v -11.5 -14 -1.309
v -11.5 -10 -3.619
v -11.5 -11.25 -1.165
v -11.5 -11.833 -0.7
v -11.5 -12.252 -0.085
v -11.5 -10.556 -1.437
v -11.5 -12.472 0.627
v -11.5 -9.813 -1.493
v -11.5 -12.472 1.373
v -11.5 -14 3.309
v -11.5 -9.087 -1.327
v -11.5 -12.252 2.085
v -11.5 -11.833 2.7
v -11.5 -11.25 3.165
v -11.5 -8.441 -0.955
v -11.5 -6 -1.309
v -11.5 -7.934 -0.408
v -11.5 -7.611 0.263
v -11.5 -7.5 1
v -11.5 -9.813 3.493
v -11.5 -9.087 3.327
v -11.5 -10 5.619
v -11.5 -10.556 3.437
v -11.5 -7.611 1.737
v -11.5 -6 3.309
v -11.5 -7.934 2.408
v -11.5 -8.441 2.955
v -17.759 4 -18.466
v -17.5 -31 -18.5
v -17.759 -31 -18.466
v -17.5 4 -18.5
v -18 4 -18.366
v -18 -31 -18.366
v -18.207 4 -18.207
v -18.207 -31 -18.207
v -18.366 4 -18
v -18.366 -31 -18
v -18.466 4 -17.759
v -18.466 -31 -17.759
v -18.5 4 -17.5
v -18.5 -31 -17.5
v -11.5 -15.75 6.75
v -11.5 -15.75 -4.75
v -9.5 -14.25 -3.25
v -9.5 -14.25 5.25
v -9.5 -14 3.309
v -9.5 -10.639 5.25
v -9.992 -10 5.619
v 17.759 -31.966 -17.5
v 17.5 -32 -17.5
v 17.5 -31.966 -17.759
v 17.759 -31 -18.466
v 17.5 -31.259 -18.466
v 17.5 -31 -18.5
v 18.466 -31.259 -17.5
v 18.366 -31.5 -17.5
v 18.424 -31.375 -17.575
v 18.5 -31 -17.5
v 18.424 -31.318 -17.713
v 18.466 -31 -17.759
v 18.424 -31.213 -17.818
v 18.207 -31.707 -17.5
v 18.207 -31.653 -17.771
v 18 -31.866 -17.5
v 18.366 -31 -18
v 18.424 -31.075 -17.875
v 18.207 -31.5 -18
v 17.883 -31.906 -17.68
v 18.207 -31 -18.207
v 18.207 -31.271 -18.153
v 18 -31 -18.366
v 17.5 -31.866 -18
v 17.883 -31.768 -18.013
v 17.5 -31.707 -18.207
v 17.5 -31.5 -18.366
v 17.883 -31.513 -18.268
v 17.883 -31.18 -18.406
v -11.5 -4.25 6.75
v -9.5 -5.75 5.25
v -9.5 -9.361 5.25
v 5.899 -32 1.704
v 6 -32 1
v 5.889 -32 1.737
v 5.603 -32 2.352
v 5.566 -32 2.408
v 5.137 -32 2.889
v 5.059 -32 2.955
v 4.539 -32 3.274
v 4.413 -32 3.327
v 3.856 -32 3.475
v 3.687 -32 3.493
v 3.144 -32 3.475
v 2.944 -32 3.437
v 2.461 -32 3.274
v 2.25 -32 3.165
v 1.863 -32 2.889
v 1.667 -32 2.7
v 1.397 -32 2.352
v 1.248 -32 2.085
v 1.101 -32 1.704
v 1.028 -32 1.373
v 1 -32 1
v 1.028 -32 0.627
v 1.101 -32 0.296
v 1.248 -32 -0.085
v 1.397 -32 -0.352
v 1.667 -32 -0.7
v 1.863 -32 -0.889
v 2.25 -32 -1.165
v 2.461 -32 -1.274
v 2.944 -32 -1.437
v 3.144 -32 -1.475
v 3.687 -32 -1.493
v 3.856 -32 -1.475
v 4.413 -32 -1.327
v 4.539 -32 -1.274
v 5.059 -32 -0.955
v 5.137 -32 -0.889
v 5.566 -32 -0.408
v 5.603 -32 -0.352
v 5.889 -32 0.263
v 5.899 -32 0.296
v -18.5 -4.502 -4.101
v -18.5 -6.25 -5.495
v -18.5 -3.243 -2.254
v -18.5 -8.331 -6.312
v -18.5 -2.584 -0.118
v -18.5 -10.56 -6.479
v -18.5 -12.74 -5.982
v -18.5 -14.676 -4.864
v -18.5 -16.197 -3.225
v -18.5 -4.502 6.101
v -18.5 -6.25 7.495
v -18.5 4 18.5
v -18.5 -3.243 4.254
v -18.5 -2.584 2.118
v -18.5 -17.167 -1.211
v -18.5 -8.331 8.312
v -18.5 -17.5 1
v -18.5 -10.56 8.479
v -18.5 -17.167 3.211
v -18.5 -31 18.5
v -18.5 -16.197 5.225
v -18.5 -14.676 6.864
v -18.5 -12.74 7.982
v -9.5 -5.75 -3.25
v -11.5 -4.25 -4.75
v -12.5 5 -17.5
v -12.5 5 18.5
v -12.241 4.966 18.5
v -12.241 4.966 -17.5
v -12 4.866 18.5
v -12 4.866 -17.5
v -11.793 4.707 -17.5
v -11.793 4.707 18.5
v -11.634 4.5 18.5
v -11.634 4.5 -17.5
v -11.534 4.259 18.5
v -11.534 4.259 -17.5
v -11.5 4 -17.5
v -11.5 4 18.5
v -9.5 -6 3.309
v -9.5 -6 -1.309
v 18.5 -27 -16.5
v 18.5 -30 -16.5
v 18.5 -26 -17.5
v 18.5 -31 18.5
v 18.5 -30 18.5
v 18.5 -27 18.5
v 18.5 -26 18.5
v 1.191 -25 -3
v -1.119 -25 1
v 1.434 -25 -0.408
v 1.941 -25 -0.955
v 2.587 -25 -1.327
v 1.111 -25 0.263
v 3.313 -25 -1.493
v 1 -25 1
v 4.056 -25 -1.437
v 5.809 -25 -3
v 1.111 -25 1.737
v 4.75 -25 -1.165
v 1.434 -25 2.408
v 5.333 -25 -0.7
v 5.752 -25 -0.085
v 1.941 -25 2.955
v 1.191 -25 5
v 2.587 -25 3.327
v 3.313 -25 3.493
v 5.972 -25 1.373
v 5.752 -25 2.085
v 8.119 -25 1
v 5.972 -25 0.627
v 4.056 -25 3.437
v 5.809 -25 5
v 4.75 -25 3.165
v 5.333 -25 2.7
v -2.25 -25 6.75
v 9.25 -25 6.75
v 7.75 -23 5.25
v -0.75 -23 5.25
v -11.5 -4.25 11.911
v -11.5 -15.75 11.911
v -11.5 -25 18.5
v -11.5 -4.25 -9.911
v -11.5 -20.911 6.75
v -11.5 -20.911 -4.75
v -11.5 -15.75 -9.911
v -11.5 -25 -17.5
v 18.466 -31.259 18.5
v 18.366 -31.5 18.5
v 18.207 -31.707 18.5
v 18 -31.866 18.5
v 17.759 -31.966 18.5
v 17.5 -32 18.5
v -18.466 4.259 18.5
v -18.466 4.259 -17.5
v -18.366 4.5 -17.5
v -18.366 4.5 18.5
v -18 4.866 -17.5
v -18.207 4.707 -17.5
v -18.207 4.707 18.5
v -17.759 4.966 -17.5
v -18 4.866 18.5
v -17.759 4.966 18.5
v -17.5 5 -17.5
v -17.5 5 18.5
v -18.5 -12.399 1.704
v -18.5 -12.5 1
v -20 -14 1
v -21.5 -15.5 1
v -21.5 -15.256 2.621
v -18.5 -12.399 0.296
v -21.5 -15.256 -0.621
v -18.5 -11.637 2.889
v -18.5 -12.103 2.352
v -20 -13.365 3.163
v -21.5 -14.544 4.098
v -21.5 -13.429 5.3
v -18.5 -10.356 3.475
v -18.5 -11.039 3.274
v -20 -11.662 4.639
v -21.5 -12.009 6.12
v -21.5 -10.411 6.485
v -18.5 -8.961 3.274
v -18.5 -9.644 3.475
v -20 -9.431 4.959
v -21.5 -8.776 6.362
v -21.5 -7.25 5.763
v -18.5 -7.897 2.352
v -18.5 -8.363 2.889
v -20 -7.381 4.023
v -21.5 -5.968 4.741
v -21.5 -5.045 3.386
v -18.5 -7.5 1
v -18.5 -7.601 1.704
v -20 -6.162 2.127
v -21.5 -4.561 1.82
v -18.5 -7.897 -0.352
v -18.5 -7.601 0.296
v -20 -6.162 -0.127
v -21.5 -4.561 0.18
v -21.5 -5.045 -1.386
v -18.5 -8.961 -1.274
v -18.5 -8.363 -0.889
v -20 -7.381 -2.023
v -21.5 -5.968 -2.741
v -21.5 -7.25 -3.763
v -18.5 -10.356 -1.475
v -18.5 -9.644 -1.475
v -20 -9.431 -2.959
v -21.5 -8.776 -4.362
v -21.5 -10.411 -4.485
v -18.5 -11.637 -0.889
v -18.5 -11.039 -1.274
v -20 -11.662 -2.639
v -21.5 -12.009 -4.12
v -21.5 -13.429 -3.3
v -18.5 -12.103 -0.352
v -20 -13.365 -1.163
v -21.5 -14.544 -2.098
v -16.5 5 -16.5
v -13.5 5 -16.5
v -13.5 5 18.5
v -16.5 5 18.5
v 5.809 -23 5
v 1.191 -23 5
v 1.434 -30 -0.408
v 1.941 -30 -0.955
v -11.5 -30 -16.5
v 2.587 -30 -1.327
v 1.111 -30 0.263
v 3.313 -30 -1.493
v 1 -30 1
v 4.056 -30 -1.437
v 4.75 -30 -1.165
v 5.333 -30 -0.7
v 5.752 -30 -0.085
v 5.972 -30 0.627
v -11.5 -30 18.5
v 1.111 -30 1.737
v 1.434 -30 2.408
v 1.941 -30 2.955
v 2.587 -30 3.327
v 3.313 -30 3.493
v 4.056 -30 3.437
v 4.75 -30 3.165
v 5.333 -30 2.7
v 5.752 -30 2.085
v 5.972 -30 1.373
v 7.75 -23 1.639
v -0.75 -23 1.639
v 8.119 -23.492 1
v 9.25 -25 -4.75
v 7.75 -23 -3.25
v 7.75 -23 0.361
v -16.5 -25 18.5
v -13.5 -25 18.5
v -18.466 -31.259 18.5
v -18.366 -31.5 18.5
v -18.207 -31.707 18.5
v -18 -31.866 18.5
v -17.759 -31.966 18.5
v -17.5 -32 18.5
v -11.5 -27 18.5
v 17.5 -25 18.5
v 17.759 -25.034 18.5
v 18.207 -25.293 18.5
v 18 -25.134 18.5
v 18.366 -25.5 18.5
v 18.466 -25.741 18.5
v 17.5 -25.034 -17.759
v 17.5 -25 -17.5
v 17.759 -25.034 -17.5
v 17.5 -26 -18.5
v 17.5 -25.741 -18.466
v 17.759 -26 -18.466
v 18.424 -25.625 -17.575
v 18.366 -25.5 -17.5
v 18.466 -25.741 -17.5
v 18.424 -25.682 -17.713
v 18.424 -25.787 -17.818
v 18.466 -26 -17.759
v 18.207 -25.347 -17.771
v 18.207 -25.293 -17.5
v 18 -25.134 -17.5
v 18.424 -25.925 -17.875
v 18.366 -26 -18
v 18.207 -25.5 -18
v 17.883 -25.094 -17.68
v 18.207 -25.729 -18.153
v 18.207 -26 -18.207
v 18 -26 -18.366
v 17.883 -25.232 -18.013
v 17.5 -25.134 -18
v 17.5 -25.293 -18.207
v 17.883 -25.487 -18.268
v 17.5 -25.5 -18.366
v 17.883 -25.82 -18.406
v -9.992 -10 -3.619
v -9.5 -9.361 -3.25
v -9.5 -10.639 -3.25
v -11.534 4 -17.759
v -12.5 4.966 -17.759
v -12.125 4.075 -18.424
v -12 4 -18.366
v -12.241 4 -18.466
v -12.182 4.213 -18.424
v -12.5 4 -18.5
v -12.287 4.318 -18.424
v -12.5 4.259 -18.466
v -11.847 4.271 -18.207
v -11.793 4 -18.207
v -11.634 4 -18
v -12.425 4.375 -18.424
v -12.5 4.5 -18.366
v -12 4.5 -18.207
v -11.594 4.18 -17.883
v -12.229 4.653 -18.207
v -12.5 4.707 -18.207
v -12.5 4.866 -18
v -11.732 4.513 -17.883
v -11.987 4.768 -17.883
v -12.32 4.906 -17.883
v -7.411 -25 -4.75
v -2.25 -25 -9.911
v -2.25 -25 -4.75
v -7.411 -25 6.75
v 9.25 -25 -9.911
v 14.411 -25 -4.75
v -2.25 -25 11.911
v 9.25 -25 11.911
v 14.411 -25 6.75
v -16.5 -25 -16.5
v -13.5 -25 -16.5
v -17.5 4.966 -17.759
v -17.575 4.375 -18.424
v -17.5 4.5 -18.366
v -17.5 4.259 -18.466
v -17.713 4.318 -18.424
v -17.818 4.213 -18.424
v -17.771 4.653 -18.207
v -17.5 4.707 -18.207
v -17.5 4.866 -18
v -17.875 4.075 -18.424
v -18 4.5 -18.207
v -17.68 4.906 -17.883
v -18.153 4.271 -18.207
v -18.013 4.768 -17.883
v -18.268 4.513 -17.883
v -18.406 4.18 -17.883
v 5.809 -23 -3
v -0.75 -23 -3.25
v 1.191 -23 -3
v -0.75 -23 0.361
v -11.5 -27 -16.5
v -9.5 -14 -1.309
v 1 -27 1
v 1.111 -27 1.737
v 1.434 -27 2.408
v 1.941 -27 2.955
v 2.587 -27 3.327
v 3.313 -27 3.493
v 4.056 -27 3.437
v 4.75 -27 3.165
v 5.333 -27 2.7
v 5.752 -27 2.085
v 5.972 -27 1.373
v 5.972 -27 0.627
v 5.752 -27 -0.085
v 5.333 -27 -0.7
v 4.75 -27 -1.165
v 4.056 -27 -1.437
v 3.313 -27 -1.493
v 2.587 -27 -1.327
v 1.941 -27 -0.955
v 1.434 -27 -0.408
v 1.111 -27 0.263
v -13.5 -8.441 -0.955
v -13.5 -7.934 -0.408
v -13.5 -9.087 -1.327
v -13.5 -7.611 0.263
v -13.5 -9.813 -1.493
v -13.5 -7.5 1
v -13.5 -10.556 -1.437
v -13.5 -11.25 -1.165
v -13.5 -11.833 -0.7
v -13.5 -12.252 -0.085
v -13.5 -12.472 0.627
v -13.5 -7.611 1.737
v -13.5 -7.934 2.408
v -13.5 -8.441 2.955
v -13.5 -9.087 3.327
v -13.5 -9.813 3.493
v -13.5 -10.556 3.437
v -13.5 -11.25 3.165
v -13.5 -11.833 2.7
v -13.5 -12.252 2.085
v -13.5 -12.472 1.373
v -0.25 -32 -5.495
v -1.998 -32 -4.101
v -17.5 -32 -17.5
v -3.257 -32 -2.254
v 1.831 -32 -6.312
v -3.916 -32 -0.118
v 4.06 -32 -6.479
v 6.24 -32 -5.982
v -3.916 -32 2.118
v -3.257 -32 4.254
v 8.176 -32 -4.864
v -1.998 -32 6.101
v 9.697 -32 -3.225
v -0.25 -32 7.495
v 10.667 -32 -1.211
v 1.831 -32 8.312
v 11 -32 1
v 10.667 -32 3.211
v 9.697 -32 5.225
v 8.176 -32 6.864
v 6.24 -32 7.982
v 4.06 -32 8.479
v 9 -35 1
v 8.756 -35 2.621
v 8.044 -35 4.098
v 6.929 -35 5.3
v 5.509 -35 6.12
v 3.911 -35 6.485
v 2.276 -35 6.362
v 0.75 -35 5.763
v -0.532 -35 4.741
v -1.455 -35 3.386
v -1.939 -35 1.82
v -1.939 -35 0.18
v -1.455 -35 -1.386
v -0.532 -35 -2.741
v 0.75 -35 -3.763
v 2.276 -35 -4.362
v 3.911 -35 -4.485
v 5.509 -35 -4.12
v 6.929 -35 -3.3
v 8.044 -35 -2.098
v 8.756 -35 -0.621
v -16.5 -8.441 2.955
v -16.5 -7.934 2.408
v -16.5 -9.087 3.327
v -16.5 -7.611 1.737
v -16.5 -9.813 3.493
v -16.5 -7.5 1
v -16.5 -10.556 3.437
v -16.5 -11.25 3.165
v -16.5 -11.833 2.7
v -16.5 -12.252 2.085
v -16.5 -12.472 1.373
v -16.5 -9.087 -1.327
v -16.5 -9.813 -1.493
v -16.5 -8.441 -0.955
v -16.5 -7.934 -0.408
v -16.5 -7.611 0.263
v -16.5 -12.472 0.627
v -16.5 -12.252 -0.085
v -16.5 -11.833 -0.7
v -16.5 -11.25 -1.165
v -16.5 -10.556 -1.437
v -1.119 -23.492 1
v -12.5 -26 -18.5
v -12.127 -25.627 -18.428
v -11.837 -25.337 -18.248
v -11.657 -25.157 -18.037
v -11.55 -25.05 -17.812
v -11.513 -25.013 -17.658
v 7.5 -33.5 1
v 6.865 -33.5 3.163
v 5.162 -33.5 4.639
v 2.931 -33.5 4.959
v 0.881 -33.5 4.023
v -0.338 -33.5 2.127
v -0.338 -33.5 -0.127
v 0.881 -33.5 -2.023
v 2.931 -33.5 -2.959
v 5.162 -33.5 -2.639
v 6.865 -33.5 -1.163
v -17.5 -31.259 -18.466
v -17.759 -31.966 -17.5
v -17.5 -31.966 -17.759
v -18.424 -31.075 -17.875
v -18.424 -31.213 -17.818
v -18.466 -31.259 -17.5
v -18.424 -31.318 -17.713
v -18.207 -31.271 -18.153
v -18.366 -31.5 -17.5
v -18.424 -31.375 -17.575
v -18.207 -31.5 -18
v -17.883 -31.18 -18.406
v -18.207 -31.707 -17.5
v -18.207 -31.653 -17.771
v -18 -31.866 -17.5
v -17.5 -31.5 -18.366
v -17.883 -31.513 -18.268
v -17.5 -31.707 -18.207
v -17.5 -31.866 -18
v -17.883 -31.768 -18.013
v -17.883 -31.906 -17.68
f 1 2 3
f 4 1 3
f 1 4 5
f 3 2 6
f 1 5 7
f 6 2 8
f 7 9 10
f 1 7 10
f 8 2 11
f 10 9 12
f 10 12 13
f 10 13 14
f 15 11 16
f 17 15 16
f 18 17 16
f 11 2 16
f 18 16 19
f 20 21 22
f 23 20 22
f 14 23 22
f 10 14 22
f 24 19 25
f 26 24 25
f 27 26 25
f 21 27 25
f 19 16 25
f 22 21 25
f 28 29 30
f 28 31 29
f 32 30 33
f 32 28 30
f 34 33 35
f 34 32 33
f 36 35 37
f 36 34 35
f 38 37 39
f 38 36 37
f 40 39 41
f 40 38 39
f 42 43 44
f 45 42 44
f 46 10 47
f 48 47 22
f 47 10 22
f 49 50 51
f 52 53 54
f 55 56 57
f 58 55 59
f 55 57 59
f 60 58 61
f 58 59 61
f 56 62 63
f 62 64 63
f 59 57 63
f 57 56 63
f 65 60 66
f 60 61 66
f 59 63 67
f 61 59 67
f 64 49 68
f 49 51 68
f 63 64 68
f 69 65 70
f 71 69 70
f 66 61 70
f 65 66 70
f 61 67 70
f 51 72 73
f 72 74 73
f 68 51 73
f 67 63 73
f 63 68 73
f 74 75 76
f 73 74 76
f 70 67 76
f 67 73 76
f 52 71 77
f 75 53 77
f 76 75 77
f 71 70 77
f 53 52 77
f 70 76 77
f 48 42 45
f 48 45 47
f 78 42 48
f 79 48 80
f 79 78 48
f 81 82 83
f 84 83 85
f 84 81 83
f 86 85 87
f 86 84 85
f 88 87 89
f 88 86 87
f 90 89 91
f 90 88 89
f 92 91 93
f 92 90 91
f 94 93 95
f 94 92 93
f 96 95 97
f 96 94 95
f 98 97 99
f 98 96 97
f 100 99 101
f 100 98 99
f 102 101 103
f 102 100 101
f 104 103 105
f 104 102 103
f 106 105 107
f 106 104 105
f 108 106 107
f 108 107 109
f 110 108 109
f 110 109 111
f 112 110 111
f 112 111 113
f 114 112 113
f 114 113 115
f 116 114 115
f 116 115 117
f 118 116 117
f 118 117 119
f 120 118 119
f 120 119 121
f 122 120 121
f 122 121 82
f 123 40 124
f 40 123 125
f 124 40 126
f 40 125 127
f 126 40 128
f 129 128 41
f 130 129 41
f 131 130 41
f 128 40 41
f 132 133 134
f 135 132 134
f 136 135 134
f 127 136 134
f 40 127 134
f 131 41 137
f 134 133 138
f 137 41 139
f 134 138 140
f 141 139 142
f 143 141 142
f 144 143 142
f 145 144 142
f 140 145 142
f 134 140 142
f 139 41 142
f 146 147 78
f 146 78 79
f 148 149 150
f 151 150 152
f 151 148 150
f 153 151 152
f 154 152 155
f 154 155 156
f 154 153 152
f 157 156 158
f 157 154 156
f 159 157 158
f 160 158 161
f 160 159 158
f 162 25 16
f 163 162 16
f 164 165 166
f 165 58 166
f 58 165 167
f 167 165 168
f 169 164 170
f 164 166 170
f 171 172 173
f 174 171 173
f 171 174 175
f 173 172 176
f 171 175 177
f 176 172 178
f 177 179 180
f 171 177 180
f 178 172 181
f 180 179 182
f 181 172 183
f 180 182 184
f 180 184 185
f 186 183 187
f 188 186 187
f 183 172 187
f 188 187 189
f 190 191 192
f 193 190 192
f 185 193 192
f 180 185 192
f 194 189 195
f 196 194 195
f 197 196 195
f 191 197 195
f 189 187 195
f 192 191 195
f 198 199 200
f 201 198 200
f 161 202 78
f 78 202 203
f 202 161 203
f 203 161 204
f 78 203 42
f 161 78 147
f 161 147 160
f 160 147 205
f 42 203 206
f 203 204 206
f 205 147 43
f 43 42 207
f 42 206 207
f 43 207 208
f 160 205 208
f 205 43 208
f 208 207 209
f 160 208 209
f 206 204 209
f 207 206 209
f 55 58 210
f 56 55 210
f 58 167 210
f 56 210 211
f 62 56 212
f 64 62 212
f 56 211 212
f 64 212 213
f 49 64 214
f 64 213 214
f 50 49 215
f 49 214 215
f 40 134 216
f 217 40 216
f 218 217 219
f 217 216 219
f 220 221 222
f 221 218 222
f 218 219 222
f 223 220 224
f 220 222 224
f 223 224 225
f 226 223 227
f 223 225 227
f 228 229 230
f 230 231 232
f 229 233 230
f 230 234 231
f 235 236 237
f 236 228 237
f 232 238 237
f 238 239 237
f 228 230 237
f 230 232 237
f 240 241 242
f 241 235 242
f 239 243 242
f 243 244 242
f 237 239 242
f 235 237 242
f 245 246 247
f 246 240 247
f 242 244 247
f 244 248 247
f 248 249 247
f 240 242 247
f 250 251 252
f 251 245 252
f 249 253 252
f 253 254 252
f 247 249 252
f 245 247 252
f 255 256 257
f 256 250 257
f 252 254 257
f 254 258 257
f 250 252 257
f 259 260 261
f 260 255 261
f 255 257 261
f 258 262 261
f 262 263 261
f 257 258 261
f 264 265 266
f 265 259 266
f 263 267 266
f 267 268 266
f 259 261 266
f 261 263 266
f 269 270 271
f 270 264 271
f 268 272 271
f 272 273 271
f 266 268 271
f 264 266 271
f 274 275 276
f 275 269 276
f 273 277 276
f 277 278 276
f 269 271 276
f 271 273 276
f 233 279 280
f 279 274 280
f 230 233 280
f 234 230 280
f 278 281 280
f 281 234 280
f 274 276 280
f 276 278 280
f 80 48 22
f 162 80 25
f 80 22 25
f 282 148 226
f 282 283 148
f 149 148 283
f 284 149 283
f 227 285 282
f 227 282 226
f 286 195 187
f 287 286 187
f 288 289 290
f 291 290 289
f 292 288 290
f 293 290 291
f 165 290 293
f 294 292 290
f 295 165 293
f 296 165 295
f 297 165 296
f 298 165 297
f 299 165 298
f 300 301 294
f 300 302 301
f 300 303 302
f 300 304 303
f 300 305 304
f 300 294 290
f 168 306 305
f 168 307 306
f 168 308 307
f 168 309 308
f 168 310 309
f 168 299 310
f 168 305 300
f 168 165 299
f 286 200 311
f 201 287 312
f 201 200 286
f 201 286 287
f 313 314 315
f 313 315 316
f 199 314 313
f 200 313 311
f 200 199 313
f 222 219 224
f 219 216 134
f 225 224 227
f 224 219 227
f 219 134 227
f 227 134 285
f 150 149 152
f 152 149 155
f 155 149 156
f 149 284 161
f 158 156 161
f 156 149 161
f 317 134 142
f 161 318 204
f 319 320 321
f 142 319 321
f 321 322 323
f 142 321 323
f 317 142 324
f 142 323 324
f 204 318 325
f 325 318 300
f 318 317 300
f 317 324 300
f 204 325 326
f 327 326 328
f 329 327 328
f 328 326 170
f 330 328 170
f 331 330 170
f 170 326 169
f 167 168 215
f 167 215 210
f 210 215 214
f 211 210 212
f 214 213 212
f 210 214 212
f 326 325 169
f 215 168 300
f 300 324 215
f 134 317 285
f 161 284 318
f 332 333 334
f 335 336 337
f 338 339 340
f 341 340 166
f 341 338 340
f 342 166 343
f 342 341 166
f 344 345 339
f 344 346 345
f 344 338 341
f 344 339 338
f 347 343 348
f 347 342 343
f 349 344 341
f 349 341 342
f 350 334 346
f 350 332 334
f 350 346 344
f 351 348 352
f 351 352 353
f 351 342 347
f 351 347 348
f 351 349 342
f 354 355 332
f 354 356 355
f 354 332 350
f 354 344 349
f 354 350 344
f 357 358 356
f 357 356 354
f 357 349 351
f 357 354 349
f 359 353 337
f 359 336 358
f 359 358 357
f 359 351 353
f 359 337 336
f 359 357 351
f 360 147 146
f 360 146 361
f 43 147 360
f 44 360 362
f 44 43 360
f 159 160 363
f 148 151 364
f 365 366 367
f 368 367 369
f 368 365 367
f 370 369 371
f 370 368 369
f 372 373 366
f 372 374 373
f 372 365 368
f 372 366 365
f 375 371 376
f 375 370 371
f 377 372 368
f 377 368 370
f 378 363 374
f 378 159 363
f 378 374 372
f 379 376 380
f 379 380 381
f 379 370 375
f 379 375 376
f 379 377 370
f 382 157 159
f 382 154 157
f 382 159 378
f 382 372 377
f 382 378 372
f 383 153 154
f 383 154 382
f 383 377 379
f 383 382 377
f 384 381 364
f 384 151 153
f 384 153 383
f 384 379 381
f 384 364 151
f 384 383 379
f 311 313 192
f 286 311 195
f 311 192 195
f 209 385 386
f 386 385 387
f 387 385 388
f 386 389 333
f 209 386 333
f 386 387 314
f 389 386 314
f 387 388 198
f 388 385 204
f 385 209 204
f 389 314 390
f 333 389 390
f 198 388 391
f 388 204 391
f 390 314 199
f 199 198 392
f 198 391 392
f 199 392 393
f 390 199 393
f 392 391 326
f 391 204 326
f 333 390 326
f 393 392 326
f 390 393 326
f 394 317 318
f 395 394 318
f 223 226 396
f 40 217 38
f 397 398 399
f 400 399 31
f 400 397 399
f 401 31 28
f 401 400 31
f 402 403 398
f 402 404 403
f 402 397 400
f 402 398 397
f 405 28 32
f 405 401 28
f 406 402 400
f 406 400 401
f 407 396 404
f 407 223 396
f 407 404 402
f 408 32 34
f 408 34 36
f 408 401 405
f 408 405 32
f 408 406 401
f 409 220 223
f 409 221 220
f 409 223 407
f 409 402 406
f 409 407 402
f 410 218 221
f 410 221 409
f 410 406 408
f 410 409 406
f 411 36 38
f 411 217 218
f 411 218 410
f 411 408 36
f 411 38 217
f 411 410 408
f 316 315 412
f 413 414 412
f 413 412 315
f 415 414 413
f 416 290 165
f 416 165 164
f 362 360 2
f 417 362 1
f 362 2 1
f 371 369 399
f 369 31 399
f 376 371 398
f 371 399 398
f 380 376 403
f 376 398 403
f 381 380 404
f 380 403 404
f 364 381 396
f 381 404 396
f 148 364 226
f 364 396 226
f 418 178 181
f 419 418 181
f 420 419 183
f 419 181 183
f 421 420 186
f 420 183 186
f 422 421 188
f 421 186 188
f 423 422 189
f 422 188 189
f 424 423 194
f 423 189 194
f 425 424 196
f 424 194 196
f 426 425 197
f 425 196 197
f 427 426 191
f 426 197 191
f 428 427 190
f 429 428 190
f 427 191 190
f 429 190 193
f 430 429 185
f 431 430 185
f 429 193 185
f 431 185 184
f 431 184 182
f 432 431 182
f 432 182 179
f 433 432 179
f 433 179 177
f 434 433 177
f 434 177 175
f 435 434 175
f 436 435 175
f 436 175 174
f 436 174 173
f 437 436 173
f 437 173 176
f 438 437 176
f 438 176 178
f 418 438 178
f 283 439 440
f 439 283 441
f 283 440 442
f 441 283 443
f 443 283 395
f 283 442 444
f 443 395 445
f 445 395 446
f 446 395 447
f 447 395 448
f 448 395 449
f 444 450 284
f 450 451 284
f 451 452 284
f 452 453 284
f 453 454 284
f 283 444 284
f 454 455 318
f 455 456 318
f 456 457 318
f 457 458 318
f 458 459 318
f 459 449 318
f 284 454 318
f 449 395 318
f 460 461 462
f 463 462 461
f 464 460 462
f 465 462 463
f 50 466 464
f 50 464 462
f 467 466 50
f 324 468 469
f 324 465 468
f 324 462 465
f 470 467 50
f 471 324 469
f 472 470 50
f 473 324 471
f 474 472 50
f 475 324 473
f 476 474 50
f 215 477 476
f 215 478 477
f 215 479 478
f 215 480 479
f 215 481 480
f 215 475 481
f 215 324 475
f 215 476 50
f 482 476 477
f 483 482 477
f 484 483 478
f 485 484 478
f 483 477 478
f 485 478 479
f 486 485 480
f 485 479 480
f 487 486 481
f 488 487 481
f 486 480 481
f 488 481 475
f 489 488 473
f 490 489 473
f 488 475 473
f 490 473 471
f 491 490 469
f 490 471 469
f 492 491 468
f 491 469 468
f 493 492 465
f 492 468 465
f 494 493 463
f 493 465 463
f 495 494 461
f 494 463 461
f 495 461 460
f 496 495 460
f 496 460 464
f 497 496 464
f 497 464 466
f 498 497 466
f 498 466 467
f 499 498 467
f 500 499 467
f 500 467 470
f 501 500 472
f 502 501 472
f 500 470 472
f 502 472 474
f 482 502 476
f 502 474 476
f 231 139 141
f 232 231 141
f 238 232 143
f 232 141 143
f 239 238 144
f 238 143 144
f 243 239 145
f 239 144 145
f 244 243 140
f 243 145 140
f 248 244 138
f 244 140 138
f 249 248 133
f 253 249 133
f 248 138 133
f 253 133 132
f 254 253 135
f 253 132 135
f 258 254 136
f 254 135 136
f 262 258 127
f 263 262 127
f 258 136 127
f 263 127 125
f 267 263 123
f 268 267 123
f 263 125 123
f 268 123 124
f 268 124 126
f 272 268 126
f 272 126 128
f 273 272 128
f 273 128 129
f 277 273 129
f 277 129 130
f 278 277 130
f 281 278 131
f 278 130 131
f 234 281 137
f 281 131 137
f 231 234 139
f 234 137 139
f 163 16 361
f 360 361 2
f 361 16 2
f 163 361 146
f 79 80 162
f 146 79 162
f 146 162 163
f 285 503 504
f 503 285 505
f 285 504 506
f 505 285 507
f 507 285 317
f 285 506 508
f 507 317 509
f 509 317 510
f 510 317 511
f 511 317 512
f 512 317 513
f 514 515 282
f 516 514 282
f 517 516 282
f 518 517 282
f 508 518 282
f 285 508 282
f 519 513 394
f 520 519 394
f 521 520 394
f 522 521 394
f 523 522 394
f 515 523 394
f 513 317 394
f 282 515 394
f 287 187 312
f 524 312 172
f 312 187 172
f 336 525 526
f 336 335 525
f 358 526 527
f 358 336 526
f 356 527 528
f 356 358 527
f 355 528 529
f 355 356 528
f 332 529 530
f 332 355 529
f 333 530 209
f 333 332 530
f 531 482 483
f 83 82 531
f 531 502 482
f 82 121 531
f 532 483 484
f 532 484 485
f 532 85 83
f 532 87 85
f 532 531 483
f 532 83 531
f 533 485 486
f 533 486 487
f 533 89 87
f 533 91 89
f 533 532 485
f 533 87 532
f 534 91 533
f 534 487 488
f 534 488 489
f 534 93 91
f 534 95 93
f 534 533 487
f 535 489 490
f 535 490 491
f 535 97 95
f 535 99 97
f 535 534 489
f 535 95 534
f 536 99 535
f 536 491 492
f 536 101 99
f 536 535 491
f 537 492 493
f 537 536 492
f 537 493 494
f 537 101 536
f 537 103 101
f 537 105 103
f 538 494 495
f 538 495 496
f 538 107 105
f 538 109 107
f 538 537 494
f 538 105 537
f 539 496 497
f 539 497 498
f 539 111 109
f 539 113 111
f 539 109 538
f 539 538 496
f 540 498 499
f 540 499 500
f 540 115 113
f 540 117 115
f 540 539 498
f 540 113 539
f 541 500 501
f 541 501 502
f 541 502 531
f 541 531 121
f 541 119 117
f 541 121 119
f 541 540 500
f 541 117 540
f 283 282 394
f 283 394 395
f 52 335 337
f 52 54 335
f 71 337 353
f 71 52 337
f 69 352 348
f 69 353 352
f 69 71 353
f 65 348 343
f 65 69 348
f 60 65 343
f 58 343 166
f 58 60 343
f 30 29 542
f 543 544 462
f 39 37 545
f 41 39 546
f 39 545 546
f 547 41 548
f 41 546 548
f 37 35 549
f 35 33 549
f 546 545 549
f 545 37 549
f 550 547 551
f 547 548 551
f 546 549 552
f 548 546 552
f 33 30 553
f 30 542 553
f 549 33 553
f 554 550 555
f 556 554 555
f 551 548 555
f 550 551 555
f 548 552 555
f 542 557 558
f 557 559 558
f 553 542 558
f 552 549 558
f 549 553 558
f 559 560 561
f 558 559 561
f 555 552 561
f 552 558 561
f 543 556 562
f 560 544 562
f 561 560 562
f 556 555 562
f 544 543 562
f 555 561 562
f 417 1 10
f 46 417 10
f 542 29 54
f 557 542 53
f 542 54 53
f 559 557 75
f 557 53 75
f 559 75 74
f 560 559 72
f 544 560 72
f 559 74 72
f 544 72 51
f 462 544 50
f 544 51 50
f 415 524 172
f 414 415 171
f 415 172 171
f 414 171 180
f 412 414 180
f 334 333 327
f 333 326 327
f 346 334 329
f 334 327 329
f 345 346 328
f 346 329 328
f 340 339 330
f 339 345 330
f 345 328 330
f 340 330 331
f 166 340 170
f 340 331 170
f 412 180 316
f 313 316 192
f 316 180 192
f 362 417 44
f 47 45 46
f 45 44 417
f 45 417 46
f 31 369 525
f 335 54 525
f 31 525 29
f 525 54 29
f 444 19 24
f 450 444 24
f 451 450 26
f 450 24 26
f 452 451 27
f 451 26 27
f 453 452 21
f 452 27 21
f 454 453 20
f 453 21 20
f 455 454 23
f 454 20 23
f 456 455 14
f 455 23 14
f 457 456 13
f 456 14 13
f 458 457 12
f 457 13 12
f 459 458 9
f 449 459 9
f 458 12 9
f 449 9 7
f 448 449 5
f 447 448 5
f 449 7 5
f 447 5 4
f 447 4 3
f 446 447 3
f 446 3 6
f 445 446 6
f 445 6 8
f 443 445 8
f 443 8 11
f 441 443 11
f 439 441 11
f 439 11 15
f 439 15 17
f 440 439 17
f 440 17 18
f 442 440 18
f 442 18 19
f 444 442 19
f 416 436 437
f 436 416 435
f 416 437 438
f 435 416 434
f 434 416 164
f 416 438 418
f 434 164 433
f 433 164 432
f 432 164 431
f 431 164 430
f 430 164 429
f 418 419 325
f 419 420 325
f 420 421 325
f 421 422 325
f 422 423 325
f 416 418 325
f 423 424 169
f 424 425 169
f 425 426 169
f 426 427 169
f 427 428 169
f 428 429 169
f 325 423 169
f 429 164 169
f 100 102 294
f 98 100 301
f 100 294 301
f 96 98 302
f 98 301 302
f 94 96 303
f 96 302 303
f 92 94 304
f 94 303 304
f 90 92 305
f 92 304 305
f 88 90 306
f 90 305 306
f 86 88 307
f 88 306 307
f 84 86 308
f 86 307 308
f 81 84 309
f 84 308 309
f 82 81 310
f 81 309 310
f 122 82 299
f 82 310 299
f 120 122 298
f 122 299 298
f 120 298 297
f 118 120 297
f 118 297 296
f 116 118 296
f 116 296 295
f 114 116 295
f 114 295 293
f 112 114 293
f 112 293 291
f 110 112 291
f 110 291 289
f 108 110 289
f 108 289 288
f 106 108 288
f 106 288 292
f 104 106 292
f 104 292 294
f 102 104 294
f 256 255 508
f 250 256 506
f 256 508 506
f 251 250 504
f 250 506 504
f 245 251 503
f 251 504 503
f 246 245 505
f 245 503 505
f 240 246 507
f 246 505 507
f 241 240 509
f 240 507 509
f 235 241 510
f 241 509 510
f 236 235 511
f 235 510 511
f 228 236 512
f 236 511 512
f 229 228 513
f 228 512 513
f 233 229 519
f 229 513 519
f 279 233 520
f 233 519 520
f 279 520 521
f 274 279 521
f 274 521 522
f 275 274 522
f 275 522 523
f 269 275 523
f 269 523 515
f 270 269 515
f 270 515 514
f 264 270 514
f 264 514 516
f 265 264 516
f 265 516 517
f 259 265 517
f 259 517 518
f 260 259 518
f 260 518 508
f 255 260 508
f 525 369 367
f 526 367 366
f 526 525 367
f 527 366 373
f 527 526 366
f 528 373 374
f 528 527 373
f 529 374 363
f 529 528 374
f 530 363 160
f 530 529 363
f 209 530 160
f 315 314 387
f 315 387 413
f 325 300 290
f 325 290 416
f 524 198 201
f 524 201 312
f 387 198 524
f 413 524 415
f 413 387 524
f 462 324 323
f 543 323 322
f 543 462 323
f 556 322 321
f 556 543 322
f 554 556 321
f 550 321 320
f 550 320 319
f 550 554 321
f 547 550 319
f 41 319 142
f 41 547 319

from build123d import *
from build123d import SkipClean  # not in build123d's __all__

# Parameters (mm, degrees)
F0_W          = 30
F0_H          = 37
F0_W_2        = 3
F0_H_2        = 35
F1_DEPTH      = 32
F2_DEPTH      = 25
F3_W          = 3
F3_H          = 35
F4_DEPTH      = 30
F5_W          = 11.5
F5_H          = 11.5
F6_DEPTH      = 2
F5_R          = 2.5
F7_DEPTH      = 25
F8_T4_DEPTH   = 21.8227903205
F8_T9_DEPTH   = 21.8227903205
F8_T14_DEPTH  = 21.8227903205
F8_T19_DEPTH  = 21.8227903205
F9_R          = 7.5
F9_R_2        = 2.5
F10_DEPTH     = 3
F11_SIZE      = 2.99999
F12_W         = 11.5
F12_H         = 11.5
F13_DEPTH     = 2
F14_T4_DEPTH  = 21.8227903205
F14_T9_DEPTH  = 21.8227903205
F14_T14_DEPTH = 21.8227903205
F14_T19_DEPTH = 21.8227903205
F12_R         = 2.5
F15_DEPTH     = 25
F16_R         = 7.5
F16_R_2       = 2.5
F17_DEPTH     = 3
F19_SIZE2     = 2.99999
F19_SIZE      = 1.99999
F19_2_SIZE2   = 2.99999
F19_2_SIZE    = 1.99999
F21_DEPTH     = 5
F22_R         = 1


# Not quite as in the source:
# - a fillet or chamfer that OpenCascade refuses, or shapes differently, is made with other operations: its cross-section is extruded or revolved along the edge and cut away or added
# - a fillet or chamfer is up to 0.001 mm smaller than in the source, because OpenCascade refuses the exact size
# - after a boolean that leaves OpenCascade's solid faulty, fix() repairs it


with BuildPart() as f1:
    # F0 (on Front) → F1 (new body)
    with BuildSketch(Plane.XZ):
        with Locations((3.5, 0)):
            Rectangle(F0_W, F0_H)
        Polygon((-18.5, -18.5), (-11.5, -18.5), (-11.5, 18.5), (-13.5, 18.5), (-13.5, -16.5), (-16.5, -16.5), (-16.5, 18.5), (-18.5, 18.5), align=None)
        with Locations((-15, 1)):
            Rectangle(F0_W_2, F0_H_2)
    extrude(amount=F1_DEPTH)

    # F0 (on Front) → F2 (cut)
    with BuildSketch(Plane.XZ):
        with Locations((3.5, 0)):
            Rectangle(F0_W, F0_H)
        with Locations((-15, 1)):
            Rectangle(F0_W_2, F0_H_2)
    extrude(amount=F2_DEPTH, mode=Mode.SUBTRACT)

    # F3 (on face) → F4 (cut)
    with BuildSketch(Plane.YZ.offset(18.5)):
        with Locations((-28.5, 1)):
            Rectangle(F3_W, F3_H)
    extrude(amount=-F4_DEPTH, mode=Mode.SUBTRACT)

    # F5 (on face) → F6 (join)
    with BuildSketch(Plane(origin=(0, -25, 0), x_dir=(-1, 0, 0), z_dir=(0, 1, 0))):
        with Locations((-3.5, 1)):
            Rectangle(F5_W, F5_H)
        Polygon((-8.1188021535, 1), (-5.8094010768, 5), (-1.1905989232, 5), (1.1188021535, 1), (-1.1905989232, -3), (-5.8094010768, -3), align=None, mode=Mode.SUBTRACT)
    extrude(amount=F6_DEPTH)

    # F5 (on face) → F7 (cut)
    with BuildSketch(Plane(origin=(0, -25, 0), x_dir=(-1, 0, 0), z_dir=(0, 1, 0))):
        with Locations((-3.5, 1)):
            Circle(F5_R)
    extrude(amount=-F7_DEPTH, mode=Mode.SUBTRACT)

    # F8: chamfer of 1.5 x 2 on 4 edges, made by hand


with BuildPart() as f8_tool2:
    # F8_s3 → F8_t4 (new body)
    with BuildSketch(Plane.XY.offset(11.9113951602)):
        Polygon((9.25, -25), (7.75, -23), (9.25, -23), align=None)
    extrude(amount=-F8_T4_DEPTH)

    split(bisect_by=Plane.XZ.offset(25), keep=Keep.BOTTOM)


with BuildPart() as f1_1:
    add(f1.part, clean=False)

    # F8_t1: cut F8_tool2
    add(f8_tool2.part, mode=Mode.SUBTRACT)


with BuildPart() as f8_tool7:
    # F8_s8 → F8_t9 (new body)
    with BuildSketch(Plane.YZ.offset(-7.4113951602)):
        Polygon((-25, 6.75), (-23, 5.25), (-23, 6.75), align=None)
    extrude(amount=F8_T9_DEPTH)

    split(bisect_by=Plane.XZ.offset(25), keep=Keep.BOTTOM)


with BuildPart() as f1_2:
    add(f1_1.part, clean=False)

    # F8_t6: cut F8_tool7
    add(f8_tool7.part, mode=Mode.SUBTRACT)


with BuildPart() as f8_tool12:
    # F8_s13 → F8_t14 (new body)
    with BuildSketch(Plane.XY.offset(-9.9113951602)):
        Polygon((-2.25, -25), (-0.75, -23), (-2.25, -23), align=None)
    extrude(amount=F8_T14_DEPTH)

    split(bisect_by=Plane.XZ.offset(25), keep=Keep.BOTTOM)


with BuildPart() as f1_3:
    add(f1_2.part, clean=False)

    # F8_t11: cut F8_tool12
    add(f8_tool12.part, mode=Mode.SUBTRACT)


with BuildPart() as f8_tool17:
    # F8_s18 → F8_t19 (new body)
    with BuildSketch(Plane.YZ.offset(14.4113951602)):
        Polygon((-25, -4.75), (-23, -3.25), (-23, -4.75), align=None)
    extrude(amount=-F8_T19_DEPTH)

    split(bisect_by=Plane.XZ.offset(25), keep=Keep.BOTTOM)


with BuildPart() as f1_4:
    add(f1_3.part, clean=False)

    # F8_t16: cut F8_tool17
    add(f8_tool17.part, mode=Mode.SUBTRACT)

    # F9 (on face) → F10 (join)
    with BuildSketch(Plane.XZ.offset(32)):
        with Locations((3.5, 1)):
            Circle(F9_R)
        with Locations((3.5, 1)):
            Circle(F9_R_2, mode=Mode.SUBTRACT)
    with SkipClean():  # cleaning this boolean's faces spoils the solid; the shape is the same uncleaned
        extrude(amount=F10_DEPTH)

    # F11 (size 3 in the source; OpenCascade refuses exactly that, so slightly less here)
    f11_edges = [f1_4.edges().sort_by_distance(p)[0] for p in [
        (1, -35, 1),
    ]]
    chamfer(f11_edges, length=F11_SIZE)

    # F12 (on face) → F13 (join)
    with BuildSketch(Plane.YZ.offset(-11.5)):
        with Locations((-10, 1)):
            Rectangle(F12_W, F12_H)
        Polygon((-10, 5.6188021535), (-6, 3.3094010768), (-6, -1.3094010768), (-10, -3.6188021535), (-14, -1.3094010768), (-14, 3.3094010768), align=None, mode=Mode.SUBTRACT)
    extrude(amount=F13_DEPTH)

    add(f1_4.part.fix(), mode=Mode.REPLACE)

    # F14: chamfer of 1.5 x 2 on 4 edges, made by hand


with BuildPart() as f14_tool2:
    # F14_s3 → F14_t4 (new body)
    with BuildSketch(Plane.XY.offset(-9.9113951602)):
        Polygon((-11.5, -4.25), (-9.5, -5.75), (-9.5, -4.25), align=None)
    extrude(amount=F14_T4_DEPTH)

    split(bisect_by=Plane.YZ.offset(-11.5), keep=Keep.TOP)


with BuildPart() as f1_5:
    add(f1_4.part, clean=False)

    # F14_t1: cut F14_tool2
    add(f14_tool2.part, mode=Mode.SUBTRACT)


with BuildPart() as f14_tool7:
    # F14_s8 → F14_t9 (new body)
    with BuildSketch(Plane.XZ.offset(20.9113951602)):
        Polygon((-11.5, -4.75), (-9.5, -3.25), (-9.5, -4.75), align=None)
    extrude(amount=-F14_T9_DEPTH)

    split(bisect_by=Plane.YZ.offset(-11.5), keep=Keep.TOP)


with BuildPart() as f1_6:
    add(f1_5.part, clean=False)

    # F14_t6: cut F14_tool7
    add(f14_tool7.part, mode=Mode.SUBTRACT)


with BuildPart() as f14_tool12:
    # F14_s13 → F14_t14 (new body)
    with BuildSketch(Plane.XY.offset(11.9113951602)):
        Polygon((-11.5, -15.75), (-9.5, -14.25), (-9.5, -15.75), align=None)
    extrude(amount=-F14_T14_DEPTH)

    split(bisect_by=Plane.YZ.offset(-11.5), keep=Keep.TOP)


with BuildPart() as f1_7:
    add(f1_6.part, clean=False)

    # F14_t11: cut F14_tool12
    add(f14_tool12.part, mode=Mode.SUBTRACT)


with BuildPart() as f14_tool17:
    # F14_s18 → F14_t19 (new body)
    with BuildSketch(Plane.XZ.offset(-0.9113951602)):
        Polygon((-11.5, 6.75), (-9.5, 5.25), (-9.5, 6.75), align=None)
    extrude(amount=F14_T19_DEPTH)

    split(bisect_by=Plane.YZ.offset(-11.5), keep=Keep.TOP)


with BuildPart() as f1_8:
    add(f1_7.part, clean=False)

    # F14_t16: cut F14_tool17
    add(f14_tool17.part, mode=Mode.SUBTRACT)

    # F12 (on face) → F15 (cut)
    with BuildSketch(Plane.YZ.offset(-11.5)):
        with Locations((-10, 1)):
            Circle(F12_R)
    extrude(amount=-F15_DEPTH, mode=Mode.SUBTRACT)

    # F16 (on face) → F17 (join)
    with BuildSketch(Plane(origin=(-18.5, 0, 0), x_dir=(0, -1, 0), z_dir=(-1, 0, 0))):
        with Locations((10, 1)):
            Circle(F16_R)
        with Locations((10, 1)):
            Circle(F16_R_2, mode=Mode.SUBTRACT)
    extrude(amount=F17_DEPTH)

    # F18: chamfer of 3 on 1 edges, made by hand

    # F18_s1 → F18_t2 (revolve, cut)
    with BuildSketch(Plane.XY.offset(1)):
        Polygon((-18.5, -12.5), (-21.5, -15.5), (-21.5, -12.5), align=None)
    revolve(axis=Axis((-21.5, -10, 1), (-1, 0, 0)), mode=Mode.SUBTRACT)

    # F19 (size 2 and 3 in the source; OpenCascade refuses exactly that, so slightly less here)
    f19_edges = [f1_8.edges().sort_by_distance(p)[0] for p in [
        (-21.5, -2.5, 1),
    ]]
    f19_side = f1_8.faces().sort_by_distance((-21.5, -2.712132, 1))[0]
    chamfer(f19_edges, length=F19_SIZE, length2=F19_SIZE2, reference=f19_side)

    # F19#2 (size 2 and 3 in the source; OpenCascade refuses exactly that, so slightly less here)
    f19_2_edges = [f1_8.edges().sort_by_distance(p)[0] for p in [
        (-4, -35, 1),
    ]]
    f19_2_side = f1_8.faces().sort_by_distance((-2.212122, -35, 1))[0]
    chamfer(f19_2_edges, length=F19_2_SIZE, length2=F19_2_SIZE2, reference=f19_2_side)

    # F20 (on face) → F21 (join)
    with BuildSketch(Plane(origin=(0, 0, 0), x_dir=(-1, 0, 0), z_dir=(0, 1, 0))):
        Polygon((11.5, -4.75), (11.5, -18.5), (18.5, -18.5), (18.5, 18.5), (16.5, 18.5), (16.5, -16.5), (13.5, -16.5), (13.5, 18.5), (11.5, 18.5), (11.5, 6.75), align=None)
    extrude(amount=F21_DEPTH)

    # F22
    f22_edges = [f1_8.edges().sort_by_distance(p)[0] for p in [
        (-11.5, 5, 0),
        (-18.5, 5, 0),
        (-11.5, -10, -18.5),
        (3.5, -25, -18.5),
        (0, -32, -18.5),
        (18.5, -32, 0),
        (18.5, -25, 0),
        (-15, 5, -18.5),
        (-18.5, -13.5, -18.5),
        (18.5, -28.5, -18.5),
        (-18.5, -32, 0),
    ]]
    fillet(f22_edges, radius=F22_R)


solid = f1_8.part
